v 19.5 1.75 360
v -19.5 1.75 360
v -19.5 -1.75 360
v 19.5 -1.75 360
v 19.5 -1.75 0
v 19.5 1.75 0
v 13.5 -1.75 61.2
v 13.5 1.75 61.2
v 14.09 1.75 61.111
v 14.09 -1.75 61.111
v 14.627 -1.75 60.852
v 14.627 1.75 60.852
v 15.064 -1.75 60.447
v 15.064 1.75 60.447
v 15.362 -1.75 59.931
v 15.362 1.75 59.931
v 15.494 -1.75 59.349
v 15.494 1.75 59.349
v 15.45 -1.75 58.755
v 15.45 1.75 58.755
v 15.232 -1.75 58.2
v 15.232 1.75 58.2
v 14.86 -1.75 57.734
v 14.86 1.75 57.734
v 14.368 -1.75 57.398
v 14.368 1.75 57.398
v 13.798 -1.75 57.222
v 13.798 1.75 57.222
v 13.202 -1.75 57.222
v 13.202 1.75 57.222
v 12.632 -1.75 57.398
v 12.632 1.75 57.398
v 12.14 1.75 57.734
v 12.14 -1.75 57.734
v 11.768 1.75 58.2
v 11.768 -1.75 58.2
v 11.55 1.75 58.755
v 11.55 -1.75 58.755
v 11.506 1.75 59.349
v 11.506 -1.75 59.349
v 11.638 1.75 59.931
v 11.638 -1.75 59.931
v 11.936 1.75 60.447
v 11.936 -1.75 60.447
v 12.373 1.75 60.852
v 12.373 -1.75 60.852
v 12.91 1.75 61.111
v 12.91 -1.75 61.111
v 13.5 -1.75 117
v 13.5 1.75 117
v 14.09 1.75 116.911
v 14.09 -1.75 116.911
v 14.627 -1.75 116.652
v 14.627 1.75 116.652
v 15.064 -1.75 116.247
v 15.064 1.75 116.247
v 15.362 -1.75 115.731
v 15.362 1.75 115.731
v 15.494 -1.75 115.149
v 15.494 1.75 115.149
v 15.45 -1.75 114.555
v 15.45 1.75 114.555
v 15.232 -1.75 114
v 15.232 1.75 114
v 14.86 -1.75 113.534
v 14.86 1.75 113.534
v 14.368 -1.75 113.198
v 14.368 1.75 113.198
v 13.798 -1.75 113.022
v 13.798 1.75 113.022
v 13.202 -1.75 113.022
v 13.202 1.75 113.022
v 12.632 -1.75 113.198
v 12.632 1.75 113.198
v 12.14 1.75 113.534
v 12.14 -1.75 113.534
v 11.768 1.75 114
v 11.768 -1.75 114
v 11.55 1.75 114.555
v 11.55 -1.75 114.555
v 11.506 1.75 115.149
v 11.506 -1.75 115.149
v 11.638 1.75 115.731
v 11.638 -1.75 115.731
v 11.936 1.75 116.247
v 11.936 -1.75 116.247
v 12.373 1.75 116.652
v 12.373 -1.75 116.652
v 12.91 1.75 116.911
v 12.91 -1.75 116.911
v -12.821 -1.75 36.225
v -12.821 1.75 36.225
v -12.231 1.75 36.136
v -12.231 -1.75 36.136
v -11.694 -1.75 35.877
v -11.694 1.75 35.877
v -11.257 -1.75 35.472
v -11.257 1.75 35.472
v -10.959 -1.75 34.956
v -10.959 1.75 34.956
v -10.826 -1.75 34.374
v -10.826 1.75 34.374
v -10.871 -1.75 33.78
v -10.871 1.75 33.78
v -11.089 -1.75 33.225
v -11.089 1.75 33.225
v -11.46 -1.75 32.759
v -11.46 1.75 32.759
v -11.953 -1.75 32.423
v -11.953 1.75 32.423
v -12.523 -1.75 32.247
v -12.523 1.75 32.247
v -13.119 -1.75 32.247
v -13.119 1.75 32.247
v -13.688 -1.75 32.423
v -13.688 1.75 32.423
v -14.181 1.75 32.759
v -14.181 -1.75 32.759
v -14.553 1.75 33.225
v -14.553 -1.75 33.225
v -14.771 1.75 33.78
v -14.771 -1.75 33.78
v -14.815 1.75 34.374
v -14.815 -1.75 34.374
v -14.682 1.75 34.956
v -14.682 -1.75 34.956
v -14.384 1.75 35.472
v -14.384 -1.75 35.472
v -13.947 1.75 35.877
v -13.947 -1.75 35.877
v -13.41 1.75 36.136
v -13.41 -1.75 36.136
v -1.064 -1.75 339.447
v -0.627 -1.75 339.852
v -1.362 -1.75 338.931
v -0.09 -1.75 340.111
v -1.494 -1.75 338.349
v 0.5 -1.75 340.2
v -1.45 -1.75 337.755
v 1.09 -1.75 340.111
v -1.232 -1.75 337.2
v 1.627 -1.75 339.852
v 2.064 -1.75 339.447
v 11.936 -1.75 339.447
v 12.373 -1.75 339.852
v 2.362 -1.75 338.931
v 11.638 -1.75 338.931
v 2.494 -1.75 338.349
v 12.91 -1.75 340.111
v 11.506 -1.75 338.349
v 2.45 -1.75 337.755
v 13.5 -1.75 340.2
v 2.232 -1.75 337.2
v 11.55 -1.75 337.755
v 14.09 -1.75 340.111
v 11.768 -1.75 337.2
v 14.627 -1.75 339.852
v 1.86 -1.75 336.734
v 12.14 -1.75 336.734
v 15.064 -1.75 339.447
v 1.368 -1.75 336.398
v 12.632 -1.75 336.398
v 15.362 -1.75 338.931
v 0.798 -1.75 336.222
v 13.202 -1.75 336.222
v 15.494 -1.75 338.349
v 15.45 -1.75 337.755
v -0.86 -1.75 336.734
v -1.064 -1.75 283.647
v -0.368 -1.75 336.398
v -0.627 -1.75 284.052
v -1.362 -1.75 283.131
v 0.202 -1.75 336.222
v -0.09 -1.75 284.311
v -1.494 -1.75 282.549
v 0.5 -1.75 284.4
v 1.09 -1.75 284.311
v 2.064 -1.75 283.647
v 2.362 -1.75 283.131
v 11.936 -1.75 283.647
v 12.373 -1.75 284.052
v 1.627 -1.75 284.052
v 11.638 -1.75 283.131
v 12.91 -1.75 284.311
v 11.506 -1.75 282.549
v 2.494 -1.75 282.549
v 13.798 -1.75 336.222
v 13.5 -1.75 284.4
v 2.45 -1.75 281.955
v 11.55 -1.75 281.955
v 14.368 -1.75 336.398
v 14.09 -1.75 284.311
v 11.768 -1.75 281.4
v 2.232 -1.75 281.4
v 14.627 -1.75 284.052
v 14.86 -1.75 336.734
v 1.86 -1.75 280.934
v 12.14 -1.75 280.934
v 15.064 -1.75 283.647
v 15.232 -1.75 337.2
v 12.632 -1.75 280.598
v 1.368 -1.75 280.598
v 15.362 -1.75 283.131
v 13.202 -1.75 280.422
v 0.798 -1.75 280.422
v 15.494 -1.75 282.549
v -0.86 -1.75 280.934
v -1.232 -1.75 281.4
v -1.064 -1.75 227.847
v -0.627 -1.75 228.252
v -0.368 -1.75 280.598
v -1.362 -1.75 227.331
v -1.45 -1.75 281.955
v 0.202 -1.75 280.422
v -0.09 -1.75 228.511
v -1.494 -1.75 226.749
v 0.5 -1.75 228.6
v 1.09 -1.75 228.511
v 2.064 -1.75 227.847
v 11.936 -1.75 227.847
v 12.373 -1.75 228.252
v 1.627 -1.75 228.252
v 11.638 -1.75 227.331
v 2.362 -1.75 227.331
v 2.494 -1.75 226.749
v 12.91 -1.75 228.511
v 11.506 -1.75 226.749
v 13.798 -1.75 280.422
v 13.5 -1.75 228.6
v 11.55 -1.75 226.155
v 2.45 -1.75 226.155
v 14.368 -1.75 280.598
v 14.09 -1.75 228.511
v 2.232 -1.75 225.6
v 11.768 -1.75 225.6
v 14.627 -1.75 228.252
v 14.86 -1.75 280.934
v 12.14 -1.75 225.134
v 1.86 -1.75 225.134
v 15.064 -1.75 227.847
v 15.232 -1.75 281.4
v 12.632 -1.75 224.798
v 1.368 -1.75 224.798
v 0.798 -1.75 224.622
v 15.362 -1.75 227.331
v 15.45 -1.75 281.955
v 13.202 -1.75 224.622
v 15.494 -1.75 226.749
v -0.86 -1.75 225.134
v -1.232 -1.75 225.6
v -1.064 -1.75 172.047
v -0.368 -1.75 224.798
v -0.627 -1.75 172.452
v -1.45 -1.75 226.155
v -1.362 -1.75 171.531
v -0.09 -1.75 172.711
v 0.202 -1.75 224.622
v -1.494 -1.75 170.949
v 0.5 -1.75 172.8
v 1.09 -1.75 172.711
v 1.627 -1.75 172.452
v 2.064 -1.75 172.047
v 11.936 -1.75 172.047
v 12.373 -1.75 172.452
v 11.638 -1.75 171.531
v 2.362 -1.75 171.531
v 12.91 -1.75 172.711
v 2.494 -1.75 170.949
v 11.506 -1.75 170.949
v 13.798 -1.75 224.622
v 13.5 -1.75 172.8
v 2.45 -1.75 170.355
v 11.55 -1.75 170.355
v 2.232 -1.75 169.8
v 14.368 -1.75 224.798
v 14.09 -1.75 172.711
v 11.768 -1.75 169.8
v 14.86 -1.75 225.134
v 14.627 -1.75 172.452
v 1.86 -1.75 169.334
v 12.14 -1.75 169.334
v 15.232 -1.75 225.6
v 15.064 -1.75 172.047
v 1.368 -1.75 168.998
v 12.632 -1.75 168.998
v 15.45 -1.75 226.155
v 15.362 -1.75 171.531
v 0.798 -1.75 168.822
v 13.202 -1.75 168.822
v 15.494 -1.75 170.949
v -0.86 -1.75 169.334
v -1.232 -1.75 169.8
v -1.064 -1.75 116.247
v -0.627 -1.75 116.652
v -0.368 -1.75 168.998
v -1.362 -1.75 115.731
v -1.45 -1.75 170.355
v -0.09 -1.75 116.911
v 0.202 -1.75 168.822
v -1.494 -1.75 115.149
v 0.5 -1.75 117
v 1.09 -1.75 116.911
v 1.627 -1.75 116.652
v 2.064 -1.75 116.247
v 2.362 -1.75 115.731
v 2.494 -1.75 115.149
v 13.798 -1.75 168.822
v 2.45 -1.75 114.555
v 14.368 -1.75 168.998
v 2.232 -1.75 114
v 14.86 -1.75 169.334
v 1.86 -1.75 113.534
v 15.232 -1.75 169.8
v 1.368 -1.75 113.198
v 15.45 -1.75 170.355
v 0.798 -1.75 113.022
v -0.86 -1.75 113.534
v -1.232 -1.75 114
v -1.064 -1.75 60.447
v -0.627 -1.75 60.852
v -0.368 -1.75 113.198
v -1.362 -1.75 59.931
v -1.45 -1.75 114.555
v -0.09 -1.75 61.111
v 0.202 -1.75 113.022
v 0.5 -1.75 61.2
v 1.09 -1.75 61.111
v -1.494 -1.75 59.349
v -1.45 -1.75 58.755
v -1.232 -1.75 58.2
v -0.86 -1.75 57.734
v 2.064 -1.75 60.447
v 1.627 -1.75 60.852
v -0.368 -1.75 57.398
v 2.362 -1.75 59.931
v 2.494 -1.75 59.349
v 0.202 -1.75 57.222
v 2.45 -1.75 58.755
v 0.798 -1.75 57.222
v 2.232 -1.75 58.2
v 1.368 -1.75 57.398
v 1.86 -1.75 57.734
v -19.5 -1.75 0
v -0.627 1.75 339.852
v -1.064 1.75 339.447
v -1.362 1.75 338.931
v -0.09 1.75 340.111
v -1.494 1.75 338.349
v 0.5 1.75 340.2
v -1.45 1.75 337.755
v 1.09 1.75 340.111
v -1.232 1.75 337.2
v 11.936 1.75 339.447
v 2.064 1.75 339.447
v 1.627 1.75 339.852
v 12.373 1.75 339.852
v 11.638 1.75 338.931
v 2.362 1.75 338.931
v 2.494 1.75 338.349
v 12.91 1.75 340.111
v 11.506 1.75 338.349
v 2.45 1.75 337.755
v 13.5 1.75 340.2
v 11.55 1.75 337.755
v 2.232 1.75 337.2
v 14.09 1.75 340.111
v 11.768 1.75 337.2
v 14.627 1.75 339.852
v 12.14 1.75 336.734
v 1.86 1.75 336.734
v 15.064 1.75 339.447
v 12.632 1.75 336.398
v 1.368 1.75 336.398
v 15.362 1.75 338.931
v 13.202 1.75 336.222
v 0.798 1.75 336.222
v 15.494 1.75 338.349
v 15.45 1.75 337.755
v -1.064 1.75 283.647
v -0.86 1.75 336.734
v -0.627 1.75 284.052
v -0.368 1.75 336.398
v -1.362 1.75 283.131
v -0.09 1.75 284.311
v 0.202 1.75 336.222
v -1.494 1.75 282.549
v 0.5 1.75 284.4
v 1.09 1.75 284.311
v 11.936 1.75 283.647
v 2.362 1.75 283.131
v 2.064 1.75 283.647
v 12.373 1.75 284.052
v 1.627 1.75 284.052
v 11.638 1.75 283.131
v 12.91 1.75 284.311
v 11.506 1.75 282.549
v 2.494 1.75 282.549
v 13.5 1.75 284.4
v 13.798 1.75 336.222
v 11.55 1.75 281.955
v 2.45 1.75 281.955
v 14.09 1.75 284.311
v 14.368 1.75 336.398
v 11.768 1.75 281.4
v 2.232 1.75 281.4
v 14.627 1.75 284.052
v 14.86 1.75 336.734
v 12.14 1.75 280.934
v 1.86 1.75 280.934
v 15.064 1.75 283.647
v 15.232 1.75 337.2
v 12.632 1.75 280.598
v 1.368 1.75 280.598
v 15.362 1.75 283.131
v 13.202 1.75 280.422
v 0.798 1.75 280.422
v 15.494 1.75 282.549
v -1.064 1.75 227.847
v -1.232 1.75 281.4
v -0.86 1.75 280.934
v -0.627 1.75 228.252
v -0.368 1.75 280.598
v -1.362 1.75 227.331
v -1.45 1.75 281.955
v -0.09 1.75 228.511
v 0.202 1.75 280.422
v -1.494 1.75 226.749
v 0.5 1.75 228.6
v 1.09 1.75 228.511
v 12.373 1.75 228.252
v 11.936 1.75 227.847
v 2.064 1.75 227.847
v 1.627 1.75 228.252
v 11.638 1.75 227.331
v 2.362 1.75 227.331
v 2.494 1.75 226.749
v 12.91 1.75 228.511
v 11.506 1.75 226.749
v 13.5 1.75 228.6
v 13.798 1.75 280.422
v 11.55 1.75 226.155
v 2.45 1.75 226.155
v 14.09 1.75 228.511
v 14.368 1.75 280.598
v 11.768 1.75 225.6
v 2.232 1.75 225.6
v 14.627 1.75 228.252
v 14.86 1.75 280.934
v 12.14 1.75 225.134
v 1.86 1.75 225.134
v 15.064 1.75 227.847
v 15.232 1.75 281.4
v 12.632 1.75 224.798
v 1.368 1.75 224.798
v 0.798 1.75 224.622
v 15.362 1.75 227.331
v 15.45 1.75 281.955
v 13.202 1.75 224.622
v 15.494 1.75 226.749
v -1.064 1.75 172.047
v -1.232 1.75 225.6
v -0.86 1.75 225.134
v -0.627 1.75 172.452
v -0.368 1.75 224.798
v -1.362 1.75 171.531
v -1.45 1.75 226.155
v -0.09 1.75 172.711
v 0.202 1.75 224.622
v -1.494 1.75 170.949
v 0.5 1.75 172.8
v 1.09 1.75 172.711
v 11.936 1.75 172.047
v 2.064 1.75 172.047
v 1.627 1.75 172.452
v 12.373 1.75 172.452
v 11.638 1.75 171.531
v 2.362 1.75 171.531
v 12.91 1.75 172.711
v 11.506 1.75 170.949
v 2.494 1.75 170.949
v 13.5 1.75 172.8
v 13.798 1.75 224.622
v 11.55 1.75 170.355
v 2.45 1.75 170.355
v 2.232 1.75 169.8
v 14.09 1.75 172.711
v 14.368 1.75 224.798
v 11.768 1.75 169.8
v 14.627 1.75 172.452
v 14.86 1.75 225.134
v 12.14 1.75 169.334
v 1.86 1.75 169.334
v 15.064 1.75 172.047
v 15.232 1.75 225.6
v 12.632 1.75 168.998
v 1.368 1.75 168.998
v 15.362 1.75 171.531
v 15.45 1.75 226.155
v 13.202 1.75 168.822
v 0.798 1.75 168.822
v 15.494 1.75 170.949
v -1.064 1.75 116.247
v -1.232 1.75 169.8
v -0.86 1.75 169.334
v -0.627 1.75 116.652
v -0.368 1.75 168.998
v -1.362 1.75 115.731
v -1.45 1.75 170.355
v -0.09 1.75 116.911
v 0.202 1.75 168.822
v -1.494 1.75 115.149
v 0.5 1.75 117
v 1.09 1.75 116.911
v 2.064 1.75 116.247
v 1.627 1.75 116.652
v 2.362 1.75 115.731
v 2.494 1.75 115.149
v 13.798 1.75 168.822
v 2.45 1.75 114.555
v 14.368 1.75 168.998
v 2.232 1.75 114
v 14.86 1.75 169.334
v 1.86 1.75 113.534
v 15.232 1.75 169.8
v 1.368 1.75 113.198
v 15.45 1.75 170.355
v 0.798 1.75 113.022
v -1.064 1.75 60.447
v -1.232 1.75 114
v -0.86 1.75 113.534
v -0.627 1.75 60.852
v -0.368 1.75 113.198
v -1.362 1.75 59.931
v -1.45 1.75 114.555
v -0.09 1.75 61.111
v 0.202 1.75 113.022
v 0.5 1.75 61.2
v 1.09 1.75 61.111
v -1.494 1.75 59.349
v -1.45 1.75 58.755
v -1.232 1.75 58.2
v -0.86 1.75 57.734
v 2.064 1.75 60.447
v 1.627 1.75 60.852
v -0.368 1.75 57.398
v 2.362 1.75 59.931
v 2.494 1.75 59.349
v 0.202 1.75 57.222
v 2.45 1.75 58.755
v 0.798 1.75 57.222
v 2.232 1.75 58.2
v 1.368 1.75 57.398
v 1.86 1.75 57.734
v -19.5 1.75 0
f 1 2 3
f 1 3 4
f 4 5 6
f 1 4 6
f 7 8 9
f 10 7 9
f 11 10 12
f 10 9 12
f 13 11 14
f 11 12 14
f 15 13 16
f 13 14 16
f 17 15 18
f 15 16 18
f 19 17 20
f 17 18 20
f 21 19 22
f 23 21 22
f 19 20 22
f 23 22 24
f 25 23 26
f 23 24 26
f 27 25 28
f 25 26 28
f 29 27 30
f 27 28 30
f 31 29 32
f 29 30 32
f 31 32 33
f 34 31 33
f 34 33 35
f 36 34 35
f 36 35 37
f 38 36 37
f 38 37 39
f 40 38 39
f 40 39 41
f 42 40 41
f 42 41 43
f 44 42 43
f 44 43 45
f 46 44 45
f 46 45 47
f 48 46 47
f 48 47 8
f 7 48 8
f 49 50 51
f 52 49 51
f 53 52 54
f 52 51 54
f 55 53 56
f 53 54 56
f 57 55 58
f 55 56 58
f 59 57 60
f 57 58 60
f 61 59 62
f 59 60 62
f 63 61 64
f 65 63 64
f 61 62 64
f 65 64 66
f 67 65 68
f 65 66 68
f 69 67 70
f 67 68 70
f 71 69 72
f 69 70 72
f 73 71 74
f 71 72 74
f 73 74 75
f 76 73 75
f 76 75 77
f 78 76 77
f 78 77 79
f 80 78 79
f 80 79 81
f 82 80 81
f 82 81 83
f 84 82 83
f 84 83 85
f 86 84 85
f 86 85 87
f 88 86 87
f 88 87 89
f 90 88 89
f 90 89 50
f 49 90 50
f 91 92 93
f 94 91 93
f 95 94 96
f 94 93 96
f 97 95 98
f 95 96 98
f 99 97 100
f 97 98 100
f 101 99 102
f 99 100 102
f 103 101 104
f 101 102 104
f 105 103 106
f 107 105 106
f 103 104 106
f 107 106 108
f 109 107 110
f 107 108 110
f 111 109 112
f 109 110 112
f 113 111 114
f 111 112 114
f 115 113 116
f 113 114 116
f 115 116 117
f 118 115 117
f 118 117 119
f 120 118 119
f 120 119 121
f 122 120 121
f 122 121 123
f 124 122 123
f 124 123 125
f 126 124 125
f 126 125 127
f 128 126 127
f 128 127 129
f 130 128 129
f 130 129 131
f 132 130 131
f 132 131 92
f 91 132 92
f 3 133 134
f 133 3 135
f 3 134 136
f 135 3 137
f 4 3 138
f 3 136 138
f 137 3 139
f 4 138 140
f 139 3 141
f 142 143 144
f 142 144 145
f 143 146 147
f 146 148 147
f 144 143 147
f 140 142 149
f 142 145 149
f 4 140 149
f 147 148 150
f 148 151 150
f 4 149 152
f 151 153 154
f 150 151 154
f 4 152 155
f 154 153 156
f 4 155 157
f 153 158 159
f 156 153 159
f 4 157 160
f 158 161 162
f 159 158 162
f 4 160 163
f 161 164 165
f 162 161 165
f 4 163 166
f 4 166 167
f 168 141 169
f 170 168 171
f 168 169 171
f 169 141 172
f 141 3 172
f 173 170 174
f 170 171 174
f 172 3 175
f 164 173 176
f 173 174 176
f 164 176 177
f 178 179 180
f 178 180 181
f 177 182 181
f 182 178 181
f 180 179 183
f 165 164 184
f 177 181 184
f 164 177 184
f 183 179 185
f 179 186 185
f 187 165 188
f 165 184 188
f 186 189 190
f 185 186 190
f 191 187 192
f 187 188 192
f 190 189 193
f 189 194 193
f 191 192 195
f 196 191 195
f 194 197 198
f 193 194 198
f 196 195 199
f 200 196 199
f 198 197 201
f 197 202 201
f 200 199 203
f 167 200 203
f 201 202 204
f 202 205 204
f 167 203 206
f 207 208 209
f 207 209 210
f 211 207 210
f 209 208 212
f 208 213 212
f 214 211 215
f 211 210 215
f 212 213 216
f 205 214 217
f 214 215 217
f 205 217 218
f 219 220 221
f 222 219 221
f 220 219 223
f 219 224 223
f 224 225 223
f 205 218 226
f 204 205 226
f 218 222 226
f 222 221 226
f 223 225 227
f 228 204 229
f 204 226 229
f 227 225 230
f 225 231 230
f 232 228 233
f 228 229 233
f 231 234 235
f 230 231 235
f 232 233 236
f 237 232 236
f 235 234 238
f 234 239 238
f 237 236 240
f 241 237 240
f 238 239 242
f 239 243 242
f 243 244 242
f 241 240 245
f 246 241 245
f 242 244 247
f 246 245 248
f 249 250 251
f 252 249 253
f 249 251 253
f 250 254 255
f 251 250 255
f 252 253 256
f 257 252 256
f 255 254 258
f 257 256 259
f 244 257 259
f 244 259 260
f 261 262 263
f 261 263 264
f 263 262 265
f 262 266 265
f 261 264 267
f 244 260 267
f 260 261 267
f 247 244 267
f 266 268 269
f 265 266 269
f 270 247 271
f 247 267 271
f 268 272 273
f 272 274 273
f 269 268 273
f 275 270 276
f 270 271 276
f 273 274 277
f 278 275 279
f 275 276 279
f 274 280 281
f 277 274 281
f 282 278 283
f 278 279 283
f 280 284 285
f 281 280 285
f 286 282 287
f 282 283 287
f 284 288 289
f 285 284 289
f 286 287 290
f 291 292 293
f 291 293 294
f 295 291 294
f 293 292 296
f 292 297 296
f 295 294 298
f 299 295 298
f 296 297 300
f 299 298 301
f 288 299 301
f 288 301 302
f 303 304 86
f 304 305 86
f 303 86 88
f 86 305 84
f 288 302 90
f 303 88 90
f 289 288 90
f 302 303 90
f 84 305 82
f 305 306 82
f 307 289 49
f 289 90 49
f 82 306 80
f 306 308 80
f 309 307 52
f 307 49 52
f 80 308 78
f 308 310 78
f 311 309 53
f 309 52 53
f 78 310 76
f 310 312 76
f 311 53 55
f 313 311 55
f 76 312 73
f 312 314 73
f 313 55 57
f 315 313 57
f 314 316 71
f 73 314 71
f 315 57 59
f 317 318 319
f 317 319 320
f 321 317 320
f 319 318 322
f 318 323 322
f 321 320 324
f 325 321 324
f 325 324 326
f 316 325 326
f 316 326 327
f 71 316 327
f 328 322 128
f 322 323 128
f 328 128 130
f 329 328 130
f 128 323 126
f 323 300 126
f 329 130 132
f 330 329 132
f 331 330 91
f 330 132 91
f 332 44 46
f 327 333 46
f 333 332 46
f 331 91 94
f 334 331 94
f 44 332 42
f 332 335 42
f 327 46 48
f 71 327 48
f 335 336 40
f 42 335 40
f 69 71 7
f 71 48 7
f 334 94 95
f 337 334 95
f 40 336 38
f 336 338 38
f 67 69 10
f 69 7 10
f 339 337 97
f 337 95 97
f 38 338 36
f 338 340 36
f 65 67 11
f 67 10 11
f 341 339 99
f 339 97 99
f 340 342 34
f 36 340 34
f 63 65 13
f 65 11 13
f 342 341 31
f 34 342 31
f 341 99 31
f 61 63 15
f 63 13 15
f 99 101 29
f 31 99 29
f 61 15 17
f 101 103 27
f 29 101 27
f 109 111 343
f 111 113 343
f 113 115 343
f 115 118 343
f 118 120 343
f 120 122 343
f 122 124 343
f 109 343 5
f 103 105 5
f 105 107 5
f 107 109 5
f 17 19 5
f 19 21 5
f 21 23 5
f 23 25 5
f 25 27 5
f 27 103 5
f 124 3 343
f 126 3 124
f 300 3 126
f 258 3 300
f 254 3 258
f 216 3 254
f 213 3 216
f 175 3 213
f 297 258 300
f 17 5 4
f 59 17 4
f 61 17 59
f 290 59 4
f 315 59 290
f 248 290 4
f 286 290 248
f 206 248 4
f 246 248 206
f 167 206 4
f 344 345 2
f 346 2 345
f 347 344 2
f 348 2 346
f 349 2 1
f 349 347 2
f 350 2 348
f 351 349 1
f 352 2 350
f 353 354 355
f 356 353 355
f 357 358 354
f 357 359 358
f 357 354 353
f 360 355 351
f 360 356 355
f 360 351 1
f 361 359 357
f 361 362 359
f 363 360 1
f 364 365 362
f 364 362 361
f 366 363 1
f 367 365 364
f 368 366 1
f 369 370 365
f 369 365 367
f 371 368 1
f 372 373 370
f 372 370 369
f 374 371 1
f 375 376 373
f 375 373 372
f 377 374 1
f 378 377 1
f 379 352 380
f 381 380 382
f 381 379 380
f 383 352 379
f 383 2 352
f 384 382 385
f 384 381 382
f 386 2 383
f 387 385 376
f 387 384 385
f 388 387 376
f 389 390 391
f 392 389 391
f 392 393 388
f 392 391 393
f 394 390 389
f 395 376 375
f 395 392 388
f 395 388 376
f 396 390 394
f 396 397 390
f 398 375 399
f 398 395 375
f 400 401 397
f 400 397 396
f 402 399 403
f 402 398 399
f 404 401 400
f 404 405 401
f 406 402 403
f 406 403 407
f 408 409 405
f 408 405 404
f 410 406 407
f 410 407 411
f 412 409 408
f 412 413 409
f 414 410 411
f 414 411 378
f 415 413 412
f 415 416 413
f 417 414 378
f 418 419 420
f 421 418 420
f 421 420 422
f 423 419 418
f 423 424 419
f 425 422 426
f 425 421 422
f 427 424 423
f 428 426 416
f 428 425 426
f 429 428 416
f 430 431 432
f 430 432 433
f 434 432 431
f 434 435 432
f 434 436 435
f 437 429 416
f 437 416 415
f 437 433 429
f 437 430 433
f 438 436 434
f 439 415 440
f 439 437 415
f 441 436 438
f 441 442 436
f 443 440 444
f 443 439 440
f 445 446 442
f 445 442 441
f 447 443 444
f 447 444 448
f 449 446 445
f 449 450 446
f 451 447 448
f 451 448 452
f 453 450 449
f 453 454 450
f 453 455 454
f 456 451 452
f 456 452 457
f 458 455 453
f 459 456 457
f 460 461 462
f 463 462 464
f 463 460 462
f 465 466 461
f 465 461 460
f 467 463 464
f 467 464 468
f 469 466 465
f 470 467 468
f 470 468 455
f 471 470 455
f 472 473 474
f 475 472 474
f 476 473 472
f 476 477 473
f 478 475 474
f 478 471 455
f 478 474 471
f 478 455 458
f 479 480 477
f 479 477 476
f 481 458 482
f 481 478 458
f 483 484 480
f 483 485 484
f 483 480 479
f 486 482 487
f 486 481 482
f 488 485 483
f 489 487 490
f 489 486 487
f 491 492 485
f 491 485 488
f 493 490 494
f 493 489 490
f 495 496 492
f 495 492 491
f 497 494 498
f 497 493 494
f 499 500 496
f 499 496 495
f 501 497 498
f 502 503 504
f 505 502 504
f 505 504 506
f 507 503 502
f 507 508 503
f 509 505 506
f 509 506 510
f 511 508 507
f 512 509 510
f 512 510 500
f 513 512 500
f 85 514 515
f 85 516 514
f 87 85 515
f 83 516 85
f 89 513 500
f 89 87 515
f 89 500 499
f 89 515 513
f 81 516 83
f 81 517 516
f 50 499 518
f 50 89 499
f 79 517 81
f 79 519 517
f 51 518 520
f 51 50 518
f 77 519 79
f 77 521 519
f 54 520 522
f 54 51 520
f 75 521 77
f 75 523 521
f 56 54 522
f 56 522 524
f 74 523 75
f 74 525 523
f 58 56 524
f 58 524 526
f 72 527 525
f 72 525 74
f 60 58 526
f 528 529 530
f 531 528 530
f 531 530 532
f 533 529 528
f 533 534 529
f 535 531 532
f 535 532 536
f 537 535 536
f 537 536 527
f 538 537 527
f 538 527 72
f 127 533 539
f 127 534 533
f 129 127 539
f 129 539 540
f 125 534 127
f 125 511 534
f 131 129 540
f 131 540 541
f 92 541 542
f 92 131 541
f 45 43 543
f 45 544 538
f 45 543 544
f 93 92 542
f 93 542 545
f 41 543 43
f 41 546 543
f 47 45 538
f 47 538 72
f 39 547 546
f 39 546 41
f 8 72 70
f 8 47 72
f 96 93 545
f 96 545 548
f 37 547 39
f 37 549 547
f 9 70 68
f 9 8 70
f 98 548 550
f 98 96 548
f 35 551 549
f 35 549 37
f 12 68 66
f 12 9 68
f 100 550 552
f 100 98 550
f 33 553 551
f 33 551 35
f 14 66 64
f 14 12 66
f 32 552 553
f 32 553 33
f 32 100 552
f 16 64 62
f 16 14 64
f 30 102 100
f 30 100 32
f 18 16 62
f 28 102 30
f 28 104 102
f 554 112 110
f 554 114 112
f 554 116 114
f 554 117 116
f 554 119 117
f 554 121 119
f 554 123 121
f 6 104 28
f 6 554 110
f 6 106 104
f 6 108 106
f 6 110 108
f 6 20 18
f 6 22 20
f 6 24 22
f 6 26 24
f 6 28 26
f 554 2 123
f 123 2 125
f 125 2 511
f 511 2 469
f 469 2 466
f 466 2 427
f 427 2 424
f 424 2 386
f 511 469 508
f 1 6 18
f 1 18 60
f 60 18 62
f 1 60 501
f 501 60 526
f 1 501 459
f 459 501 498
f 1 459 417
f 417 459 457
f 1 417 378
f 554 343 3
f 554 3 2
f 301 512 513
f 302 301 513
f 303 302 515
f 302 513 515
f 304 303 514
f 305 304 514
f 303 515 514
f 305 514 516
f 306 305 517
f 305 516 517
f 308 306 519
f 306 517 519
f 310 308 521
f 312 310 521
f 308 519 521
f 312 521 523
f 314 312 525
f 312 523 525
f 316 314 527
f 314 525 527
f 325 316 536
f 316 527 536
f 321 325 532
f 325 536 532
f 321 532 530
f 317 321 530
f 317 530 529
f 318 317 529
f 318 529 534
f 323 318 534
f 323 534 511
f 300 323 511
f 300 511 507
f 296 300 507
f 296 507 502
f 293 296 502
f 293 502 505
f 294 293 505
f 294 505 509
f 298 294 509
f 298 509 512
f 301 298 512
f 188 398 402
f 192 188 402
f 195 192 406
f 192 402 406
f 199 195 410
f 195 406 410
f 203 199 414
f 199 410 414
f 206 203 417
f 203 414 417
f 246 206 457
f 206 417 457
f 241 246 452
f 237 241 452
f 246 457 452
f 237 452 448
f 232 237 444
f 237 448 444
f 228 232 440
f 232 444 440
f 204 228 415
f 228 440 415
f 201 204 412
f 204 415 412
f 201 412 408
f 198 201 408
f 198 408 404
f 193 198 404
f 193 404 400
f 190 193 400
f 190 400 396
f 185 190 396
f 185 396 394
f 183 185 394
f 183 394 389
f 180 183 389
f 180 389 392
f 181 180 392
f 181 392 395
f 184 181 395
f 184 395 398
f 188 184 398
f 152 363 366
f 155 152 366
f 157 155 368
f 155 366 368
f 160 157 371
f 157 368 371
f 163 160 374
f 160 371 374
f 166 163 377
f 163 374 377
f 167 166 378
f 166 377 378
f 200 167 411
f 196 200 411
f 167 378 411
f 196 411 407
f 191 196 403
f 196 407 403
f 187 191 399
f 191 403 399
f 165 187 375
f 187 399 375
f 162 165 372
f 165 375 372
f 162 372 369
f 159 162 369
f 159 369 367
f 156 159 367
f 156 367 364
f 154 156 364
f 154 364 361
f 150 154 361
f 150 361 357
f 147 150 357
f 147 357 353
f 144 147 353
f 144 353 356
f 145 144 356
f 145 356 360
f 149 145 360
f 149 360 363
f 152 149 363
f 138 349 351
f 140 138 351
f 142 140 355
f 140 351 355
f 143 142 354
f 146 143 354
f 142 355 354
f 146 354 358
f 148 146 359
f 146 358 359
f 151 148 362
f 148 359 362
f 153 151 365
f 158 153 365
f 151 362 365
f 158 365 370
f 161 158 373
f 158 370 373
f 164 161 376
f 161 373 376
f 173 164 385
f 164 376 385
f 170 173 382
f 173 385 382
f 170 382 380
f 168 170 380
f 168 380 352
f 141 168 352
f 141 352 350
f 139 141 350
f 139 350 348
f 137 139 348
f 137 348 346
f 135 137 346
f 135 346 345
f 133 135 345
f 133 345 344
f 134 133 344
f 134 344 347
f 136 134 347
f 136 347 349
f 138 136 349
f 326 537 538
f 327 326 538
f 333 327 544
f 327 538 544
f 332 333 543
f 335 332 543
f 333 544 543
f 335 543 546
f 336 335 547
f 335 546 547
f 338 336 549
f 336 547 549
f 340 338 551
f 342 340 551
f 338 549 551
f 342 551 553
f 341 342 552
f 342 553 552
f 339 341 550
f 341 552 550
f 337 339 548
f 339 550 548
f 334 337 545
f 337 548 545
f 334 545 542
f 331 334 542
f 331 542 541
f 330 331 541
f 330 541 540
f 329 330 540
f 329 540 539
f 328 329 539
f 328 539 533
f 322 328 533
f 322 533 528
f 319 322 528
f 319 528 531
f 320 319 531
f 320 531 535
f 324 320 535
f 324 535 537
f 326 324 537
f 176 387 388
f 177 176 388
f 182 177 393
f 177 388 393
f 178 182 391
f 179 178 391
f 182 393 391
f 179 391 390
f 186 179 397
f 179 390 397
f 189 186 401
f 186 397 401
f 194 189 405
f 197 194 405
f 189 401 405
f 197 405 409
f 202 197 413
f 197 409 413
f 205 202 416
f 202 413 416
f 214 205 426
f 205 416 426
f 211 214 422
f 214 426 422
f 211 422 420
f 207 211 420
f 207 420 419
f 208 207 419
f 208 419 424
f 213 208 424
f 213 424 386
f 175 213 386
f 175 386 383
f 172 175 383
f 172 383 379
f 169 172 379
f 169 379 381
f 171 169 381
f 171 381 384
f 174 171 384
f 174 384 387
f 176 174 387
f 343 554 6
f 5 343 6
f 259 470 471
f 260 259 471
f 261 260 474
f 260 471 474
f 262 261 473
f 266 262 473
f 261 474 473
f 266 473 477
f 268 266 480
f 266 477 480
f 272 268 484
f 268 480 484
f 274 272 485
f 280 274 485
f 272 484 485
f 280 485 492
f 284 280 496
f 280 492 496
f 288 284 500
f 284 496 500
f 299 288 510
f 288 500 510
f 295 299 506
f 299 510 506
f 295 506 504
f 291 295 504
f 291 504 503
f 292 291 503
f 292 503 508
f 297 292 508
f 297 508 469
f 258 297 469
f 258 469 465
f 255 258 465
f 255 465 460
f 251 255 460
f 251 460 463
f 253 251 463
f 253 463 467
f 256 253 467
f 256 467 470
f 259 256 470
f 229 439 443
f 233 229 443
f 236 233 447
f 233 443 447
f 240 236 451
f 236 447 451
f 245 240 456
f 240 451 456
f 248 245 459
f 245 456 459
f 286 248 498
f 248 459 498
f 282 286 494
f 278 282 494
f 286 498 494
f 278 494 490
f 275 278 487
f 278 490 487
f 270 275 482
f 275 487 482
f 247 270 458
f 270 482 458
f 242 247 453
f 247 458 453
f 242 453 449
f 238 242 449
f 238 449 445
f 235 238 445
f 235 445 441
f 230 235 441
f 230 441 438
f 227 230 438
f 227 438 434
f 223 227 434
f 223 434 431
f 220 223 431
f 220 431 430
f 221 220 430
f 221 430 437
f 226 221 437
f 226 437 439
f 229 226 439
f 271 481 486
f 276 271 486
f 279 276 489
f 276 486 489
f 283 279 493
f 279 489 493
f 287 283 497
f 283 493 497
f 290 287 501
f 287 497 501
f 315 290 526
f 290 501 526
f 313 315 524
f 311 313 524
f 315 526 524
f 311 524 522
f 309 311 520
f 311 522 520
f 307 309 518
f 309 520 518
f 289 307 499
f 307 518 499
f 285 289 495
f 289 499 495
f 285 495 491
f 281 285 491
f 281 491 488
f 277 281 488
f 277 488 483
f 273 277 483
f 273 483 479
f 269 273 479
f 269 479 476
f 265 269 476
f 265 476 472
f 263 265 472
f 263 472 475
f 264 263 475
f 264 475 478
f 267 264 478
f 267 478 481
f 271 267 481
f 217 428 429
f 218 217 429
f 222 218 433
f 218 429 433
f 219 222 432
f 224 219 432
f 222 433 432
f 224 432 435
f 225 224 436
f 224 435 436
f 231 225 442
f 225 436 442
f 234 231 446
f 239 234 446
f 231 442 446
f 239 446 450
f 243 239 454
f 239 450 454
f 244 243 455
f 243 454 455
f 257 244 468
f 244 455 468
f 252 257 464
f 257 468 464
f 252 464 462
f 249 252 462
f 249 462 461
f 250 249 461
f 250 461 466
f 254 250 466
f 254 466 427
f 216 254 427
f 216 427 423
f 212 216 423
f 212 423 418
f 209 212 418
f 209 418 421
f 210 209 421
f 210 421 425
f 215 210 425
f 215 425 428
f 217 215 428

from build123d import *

# Parameters (mm, degrees)
SKETCH1_W           = 39
SKETCH1_H           = 3.5
BOSS_EXTRUDE1_DEPTH = 360
SKETCH2_R           = 2
CUT_EXTRUDE1_DEPTH  = 10
SKETCH3_R           = 2
CUT_EXTRUDE2_DEPTH  = 10
LPATTERN1_COUNT     = 6
LPATTERN1_PITCH     = 55.8


with BuildPart() as part:
    # Sketch1 → Boss-Extrude1 (new body)
    with BuildSketch(Plane.XY):
        Rectangle(SKETCH1_W, SKETCH1_H)
    extrude(amount=BOSS_EXTRUDE1_DEPTH)

    # Sketch2 → Cut-Extrude1 (cut)
    with BuildSketch(Plane(origin=(0, 1.75, 0), x_dir=(1, 0, 0), z_dir=(0, 1, 0))):
        with Locations(Location((-12.820655038, -34.224890394, 0), (0, 0, 270))):
            Circle(SKETCH2_R)
    extrude(amount=-CUT_EXTRUDE1_DEPTH, mode=Mode.SUBTRACT)

    # Sketch3 → Cut-Extrude2 (cut)
    with BuildSketch(Plane(origin=(0, 1.75, 0), x_dir=(1, 0, 0), z_dir=(0, 1, 0))):
        with Locations(Location((0.5, -59.2, 0), (0, 0, 270))):
            Circle(SKETCH3_R)
        with Locations(Location((13.5, -59.2, 0), (0, 0, 270))):
            Circle(SKETCH3_R)
    cut_extrude2 = extrude(amount=-CUT_EXTRUDE2_DEPTH, mode=Mode.SUBTRACT)

    # LPattern1: Cut-Extrude2 ×6
    with Locations(*[(0, 0, i * LPATTERN1_PITCH) for i in range(1, LPATTERN1_COUNT)]):
        add(cut_extrude2, mode=Mode.SUBTRACT)


solid = part.part
